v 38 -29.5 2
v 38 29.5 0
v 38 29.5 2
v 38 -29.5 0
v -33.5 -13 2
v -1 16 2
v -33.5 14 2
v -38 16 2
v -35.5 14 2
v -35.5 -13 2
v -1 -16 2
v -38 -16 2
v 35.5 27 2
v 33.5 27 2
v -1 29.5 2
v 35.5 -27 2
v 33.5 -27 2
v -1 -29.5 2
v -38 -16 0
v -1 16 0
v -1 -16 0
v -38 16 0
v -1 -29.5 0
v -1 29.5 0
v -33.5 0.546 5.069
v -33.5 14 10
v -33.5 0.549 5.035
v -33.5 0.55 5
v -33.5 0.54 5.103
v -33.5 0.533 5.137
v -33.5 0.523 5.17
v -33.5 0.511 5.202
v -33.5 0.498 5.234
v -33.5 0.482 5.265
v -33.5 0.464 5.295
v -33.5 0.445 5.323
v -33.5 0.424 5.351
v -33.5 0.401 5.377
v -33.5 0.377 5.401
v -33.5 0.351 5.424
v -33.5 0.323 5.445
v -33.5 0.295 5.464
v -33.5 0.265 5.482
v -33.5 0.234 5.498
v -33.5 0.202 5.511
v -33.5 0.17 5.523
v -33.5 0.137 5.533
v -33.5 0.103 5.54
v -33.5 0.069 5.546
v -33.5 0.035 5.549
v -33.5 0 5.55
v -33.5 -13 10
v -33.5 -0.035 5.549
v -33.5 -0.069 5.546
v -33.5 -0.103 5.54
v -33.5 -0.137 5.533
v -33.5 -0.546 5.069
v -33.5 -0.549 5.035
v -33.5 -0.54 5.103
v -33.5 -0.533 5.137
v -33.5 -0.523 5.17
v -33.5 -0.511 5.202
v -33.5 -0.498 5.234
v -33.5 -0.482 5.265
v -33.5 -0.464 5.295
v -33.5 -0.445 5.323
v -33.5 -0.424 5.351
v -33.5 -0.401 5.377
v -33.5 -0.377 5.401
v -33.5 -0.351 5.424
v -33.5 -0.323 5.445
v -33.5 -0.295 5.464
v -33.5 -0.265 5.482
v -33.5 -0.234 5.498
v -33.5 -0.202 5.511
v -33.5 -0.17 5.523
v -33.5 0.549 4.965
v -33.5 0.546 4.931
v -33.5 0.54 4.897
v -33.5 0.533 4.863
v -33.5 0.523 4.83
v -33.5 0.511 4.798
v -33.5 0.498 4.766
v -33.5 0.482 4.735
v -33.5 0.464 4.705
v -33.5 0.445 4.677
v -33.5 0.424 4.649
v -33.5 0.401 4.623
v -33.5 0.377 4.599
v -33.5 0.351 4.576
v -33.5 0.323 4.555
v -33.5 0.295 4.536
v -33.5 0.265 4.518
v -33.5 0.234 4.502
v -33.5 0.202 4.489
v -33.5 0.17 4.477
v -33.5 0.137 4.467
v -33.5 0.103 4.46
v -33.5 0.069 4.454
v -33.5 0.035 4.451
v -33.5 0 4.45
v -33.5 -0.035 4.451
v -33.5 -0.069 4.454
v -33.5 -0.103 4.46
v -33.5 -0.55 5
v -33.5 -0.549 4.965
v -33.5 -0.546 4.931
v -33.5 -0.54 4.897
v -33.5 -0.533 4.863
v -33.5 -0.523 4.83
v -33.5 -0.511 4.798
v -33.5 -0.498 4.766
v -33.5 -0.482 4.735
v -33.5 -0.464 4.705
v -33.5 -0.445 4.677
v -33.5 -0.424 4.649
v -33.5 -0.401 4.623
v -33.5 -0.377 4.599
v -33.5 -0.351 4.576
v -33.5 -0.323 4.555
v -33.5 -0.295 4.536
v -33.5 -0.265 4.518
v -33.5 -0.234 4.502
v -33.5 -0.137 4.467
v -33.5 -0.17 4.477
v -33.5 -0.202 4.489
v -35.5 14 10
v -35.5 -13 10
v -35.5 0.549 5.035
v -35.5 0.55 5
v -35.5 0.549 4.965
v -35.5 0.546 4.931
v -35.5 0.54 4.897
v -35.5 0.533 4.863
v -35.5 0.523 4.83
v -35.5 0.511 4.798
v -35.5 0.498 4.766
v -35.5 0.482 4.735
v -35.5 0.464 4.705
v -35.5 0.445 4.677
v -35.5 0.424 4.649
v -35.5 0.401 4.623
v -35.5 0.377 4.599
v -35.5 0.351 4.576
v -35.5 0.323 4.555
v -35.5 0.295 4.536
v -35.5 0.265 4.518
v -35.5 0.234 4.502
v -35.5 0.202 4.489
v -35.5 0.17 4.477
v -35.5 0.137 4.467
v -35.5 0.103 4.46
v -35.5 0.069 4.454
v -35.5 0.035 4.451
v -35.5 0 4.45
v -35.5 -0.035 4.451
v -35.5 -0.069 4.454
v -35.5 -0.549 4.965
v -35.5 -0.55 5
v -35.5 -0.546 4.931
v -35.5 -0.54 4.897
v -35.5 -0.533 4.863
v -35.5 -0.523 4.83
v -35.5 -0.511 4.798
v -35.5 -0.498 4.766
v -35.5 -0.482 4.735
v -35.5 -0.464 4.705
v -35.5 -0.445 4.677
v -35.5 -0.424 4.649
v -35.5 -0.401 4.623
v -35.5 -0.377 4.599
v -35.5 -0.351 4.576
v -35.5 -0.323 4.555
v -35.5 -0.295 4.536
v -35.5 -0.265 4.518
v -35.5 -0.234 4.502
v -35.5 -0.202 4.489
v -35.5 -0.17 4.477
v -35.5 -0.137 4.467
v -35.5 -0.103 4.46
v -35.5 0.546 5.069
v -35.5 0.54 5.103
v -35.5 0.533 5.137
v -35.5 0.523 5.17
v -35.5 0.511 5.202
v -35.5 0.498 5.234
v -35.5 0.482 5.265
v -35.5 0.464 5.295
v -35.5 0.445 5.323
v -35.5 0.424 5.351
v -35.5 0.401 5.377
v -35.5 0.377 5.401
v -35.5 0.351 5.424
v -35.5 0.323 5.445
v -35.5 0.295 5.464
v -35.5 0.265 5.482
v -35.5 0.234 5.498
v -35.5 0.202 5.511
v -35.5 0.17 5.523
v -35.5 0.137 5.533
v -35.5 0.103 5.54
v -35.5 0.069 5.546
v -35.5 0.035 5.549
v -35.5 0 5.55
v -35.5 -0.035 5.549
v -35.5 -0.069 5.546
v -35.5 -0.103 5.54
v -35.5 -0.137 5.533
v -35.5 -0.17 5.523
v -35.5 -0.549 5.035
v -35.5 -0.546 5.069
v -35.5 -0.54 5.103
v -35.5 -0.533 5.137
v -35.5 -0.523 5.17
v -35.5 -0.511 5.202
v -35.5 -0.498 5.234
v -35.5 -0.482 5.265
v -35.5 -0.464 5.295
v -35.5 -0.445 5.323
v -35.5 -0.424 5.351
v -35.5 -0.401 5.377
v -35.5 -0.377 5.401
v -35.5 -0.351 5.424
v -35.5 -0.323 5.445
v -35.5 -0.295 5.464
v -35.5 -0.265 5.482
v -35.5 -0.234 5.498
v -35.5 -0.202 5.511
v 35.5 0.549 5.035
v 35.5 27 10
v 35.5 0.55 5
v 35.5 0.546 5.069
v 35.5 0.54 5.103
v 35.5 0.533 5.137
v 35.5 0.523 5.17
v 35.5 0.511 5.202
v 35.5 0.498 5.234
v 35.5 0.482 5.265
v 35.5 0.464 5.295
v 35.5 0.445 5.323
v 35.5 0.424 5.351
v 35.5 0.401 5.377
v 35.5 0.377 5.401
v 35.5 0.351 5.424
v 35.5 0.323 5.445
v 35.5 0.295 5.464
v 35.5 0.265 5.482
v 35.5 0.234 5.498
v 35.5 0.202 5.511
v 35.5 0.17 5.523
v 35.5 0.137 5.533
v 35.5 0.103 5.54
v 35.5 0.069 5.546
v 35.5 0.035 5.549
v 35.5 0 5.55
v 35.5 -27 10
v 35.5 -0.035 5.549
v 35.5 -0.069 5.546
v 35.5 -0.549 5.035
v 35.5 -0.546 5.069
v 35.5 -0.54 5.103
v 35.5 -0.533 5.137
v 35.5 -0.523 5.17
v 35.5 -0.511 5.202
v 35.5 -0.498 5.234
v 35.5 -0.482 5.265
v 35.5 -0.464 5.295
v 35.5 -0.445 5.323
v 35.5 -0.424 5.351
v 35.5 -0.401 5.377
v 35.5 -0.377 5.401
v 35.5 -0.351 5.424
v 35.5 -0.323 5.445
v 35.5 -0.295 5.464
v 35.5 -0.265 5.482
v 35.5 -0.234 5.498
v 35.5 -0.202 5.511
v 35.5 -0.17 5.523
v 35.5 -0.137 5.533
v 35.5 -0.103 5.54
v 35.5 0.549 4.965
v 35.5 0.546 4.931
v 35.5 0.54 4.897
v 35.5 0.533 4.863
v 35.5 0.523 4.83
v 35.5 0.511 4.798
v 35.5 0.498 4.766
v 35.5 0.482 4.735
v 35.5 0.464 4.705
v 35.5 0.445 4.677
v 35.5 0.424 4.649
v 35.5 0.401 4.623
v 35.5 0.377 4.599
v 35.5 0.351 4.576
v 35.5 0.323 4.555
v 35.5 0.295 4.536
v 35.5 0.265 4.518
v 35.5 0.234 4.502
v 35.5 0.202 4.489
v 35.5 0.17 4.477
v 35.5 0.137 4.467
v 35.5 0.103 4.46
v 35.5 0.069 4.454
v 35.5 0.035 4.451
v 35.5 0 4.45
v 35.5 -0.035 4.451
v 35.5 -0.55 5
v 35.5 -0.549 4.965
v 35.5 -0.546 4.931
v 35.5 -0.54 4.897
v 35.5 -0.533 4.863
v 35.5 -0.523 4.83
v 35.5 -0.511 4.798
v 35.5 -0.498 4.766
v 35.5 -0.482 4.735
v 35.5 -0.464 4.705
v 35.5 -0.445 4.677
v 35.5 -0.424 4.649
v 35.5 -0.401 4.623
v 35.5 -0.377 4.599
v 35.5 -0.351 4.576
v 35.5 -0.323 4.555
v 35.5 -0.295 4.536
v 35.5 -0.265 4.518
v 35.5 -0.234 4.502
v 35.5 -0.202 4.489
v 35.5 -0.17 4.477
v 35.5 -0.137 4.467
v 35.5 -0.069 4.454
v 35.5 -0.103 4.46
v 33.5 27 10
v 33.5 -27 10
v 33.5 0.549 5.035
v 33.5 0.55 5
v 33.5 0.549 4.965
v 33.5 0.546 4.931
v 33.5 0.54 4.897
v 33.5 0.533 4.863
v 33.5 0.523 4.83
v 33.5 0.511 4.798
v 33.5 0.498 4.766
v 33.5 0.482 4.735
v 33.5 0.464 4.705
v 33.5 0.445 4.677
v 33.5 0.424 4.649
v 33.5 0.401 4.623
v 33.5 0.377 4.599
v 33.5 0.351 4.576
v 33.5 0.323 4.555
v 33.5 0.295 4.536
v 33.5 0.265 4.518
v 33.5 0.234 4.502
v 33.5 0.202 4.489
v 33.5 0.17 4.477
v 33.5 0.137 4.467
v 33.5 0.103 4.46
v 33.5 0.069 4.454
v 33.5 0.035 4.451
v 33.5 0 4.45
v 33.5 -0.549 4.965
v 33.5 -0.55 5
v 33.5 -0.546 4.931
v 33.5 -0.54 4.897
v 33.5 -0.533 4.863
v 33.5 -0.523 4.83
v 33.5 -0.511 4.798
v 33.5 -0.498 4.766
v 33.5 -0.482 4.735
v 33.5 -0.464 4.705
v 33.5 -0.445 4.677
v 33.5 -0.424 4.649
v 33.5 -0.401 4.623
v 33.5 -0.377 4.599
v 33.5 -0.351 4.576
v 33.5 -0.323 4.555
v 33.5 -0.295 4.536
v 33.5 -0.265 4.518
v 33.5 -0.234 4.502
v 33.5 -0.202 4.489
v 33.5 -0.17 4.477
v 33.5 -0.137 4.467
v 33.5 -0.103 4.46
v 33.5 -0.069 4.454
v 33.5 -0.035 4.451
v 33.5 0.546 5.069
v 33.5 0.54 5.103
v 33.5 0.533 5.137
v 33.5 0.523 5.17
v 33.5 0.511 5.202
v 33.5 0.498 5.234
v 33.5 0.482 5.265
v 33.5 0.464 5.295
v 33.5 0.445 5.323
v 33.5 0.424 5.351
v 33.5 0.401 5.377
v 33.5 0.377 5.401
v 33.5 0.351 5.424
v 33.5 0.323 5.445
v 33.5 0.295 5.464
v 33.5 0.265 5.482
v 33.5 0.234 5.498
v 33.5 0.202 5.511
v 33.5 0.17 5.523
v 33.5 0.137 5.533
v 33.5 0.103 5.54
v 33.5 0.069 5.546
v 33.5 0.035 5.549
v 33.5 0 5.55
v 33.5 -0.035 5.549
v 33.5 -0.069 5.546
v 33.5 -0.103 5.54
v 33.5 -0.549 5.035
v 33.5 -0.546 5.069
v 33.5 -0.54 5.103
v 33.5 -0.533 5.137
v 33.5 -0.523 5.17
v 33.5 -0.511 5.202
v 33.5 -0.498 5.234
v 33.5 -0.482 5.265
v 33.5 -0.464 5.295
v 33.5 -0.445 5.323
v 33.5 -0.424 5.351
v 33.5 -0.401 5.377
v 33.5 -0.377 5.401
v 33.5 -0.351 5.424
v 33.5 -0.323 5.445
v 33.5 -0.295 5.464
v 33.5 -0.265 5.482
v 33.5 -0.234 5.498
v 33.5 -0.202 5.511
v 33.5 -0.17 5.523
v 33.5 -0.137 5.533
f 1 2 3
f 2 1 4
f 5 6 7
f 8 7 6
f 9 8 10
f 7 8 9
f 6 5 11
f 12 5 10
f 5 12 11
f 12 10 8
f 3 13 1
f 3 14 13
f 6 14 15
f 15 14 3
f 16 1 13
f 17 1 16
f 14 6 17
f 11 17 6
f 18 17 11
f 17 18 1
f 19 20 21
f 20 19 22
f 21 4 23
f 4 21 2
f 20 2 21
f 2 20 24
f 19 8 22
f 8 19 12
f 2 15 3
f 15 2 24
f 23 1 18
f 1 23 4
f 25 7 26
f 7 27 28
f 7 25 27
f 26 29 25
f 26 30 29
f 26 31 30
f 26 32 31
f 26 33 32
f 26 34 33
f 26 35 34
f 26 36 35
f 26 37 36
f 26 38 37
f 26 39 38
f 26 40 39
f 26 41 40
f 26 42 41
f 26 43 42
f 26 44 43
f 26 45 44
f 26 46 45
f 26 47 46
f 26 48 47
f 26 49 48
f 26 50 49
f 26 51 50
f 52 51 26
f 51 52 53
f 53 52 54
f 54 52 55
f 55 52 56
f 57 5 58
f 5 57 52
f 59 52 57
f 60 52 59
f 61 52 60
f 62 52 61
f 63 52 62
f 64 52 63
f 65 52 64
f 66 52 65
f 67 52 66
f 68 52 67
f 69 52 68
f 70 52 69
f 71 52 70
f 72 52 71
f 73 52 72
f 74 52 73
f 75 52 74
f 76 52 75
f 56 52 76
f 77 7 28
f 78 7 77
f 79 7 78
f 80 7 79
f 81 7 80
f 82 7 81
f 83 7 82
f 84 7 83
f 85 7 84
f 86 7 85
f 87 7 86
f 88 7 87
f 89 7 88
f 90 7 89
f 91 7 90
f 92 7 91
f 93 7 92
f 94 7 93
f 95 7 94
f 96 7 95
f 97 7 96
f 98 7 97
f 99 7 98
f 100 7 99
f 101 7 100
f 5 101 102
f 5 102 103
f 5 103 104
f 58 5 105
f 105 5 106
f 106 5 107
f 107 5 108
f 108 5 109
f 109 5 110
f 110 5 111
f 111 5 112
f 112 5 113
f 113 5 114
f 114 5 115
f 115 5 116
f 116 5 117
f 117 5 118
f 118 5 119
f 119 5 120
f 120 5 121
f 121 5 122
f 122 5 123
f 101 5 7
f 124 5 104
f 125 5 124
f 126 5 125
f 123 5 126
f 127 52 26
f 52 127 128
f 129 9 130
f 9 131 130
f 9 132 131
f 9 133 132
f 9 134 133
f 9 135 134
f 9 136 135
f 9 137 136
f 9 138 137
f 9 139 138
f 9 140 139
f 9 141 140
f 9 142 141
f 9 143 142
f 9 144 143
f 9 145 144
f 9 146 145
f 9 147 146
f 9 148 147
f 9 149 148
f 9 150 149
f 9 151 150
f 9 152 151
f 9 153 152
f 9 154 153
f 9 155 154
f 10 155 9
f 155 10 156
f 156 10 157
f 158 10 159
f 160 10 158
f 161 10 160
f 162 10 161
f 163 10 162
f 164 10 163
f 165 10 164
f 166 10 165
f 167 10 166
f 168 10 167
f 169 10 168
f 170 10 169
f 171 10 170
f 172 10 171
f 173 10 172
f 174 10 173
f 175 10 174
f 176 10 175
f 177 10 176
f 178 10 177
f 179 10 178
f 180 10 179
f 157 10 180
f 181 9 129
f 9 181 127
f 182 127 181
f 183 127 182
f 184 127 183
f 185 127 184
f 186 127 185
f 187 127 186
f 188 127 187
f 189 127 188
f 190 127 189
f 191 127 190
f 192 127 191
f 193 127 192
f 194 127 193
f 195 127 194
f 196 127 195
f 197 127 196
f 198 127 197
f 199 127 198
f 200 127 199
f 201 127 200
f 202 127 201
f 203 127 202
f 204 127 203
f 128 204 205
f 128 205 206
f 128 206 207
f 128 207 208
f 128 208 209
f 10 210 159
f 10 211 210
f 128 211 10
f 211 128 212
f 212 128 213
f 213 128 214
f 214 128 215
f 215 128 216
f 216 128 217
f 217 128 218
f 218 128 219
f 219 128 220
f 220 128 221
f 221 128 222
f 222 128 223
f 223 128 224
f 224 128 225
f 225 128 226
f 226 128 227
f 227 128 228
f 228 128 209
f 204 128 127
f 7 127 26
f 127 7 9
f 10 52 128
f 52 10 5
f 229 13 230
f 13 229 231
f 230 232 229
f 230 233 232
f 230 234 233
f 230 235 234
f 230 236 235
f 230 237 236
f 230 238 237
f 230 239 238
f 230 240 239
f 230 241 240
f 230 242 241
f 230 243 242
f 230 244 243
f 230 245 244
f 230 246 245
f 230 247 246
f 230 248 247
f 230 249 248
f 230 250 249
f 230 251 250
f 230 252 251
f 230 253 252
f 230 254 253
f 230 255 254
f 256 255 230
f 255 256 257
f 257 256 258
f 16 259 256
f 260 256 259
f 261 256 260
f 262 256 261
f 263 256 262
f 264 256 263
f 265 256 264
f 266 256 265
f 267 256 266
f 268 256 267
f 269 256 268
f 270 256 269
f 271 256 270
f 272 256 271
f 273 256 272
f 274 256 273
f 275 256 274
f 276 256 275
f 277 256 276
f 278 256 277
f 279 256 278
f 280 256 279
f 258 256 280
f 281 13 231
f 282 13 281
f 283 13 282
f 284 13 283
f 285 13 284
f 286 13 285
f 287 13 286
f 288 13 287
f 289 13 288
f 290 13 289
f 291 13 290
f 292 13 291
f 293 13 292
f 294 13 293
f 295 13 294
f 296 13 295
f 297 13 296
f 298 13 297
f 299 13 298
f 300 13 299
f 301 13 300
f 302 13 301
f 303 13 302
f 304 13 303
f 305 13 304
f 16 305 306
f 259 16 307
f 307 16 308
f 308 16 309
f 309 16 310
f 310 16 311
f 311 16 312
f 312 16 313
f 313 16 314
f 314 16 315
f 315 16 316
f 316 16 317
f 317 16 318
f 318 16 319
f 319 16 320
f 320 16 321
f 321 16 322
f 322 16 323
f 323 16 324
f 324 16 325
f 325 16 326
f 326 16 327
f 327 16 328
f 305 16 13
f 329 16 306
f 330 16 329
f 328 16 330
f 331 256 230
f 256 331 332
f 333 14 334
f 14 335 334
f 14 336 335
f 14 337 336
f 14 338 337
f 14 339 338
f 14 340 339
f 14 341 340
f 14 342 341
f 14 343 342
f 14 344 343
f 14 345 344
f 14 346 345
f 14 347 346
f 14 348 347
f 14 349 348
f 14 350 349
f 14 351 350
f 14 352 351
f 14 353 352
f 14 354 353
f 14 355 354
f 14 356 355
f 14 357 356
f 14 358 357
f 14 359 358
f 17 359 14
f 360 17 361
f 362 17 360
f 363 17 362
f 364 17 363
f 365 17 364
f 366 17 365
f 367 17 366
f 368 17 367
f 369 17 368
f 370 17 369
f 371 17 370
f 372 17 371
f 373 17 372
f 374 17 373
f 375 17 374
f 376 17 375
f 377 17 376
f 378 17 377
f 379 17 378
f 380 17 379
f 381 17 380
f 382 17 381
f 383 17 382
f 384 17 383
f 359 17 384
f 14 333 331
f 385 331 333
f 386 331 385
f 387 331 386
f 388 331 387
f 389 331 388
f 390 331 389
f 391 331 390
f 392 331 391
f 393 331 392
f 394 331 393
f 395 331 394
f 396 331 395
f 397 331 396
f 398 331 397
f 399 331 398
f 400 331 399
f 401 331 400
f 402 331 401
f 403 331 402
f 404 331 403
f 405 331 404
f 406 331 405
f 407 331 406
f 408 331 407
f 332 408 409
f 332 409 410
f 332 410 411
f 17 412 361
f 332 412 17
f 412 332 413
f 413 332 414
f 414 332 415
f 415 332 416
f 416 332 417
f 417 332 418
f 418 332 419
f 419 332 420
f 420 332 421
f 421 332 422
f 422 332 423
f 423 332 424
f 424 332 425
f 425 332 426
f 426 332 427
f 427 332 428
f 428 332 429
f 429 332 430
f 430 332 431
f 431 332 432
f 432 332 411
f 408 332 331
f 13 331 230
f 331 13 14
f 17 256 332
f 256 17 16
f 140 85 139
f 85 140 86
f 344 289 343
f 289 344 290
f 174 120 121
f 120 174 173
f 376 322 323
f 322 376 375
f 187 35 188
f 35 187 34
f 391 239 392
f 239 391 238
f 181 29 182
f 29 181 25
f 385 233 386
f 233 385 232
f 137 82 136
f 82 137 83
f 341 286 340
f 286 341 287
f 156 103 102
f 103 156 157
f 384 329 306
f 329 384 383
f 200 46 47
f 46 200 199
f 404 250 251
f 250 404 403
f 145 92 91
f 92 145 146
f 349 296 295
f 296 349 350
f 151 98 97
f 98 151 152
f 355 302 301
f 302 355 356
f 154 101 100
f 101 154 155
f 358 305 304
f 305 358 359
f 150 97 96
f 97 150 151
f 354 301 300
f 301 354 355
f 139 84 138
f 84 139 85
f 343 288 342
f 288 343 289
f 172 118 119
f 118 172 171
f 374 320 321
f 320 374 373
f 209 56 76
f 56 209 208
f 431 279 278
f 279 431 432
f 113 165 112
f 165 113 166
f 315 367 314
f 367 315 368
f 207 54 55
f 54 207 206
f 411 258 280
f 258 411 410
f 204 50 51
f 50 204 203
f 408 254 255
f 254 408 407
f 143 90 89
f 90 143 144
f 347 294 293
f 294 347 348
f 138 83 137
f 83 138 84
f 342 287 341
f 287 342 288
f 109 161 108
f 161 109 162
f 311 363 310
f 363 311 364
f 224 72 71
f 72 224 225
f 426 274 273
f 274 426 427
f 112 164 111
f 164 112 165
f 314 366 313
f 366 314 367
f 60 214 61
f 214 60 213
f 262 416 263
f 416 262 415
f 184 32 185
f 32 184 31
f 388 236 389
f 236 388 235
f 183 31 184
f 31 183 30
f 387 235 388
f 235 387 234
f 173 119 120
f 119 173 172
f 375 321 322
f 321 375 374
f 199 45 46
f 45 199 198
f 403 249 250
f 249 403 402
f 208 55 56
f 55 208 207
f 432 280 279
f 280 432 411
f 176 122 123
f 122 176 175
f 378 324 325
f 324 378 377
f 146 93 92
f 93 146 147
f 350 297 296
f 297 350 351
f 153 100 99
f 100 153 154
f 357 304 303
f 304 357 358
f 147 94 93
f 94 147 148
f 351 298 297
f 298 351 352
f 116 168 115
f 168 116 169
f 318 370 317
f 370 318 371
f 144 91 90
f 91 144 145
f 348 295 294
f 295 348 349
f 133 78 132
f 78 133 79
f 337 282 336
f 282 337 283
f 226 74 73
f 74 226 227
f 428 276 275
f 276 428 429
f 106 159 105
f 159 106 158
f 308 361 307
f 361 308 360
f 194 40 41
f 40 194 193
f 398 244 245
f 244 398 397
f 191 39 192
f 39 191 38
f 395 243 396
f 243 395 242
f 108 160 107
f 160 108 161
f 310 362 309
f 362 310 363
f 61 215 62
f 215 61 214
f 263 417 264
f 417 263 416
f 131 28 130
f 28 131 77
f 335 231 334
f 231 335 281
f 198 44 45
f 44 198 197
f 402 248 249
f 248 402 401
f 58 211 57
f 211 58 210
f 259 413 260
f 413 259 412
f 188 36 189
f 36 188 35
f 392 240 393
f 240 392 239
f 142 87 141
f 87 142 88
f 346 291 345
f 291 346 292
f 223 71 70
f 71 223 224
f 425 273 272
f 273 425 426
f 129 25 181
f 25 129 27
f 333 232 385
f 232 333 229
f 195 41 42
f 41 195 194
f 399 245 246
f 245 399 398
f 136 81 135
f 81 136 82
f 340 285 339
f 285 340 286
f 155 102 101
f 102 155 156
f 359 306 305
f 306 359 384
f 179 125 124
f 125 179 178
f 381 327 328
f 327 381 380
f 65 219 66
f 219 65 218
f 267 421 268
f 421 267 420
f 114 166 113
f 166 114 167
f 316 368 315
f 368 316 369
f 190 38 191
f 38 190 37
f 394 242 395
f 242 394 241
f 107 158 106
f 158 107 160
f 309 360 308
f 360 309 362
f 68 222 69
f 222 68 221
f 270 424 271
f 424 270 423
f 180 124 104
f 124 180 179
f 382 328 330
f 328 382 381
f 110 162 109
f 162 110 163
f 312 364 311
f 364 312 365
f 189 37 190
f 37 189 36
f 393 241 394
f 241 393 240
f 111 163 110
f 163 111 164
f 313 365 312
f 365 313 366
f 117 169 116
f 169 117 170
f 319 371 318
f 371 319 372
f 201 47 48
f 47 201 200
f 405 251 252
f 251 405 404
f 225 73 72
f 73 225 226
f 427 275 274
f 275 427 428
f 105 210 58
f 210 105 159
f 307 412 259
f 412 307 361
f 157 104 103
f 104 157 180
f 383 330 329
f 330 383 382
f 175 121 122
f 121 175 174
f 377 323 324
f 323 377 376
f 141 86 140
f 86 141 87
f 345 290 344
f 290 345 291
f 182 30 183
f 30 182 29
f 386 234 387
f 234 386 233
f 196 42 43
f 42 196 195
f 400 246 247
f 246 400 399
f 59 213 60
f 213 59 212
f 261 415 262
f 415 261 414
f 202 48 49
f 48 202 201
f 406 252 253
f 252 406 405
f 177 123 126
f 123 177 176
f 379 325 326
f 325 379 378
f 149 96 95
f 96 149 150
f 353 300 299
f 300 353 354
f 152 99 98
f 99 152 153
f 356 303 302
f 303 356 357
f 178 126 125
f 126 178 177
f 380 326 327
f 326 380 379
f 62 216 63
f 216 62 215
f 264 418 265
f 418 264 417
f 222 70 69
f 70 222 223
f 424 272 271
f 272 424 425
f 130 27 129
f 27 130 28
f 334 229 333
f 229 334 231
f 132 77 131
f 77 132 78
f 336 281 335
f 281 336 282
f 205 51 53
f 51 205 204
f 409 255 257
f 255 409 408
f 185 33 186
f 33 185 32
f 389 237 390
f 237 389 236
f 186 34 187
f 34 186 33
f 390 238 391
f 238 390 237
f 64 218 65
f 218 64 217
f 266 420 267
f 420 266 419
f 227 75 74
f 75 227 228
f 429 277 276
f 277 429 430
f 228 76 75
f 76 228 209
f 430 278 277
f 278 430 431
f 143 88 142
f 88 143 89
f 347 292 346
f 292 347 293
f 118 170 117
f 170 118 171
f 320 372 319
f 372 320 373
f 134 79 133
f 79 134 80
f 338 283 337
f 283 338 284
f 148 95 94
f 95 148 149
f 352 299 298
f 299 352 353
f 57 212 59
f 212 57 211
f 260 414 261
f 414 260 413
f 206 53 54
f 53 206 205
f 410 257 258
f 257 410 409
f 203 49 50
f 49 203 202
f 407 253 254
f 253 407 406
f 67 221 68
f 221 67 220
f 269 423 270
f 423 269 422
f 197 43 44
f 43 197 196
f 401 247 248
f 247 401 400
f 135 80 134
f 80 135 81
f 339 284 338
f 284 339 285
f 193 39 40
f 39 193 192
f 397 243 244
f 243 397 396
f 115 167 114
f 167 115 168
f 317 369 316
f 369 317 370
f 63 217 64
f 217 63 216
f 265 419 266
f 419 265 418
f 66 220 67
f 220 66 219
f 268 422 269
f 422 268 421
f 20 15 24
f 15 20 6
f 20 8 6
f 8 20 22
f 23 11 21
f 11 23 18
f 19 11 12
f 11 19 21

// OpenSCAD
//  IR remote sender 
//
//	v 1.0 - 01/06/2020 - initial release (Marc Durvaux)
//
//  
//
//

// design control
test_fit   = 0 ;	// set to one for test fit
top_bottom = 1 ;	// 0 = bottom only, 1 = top only
ear_mouse  = 0 ;    // set to one to add ear mouse to avoid warping during 3D printing

// parameters
$fn = 100 ;
tol        = 0.50 ;	    // 
wall_th    = 2.00 ;     // side wall thickness

mouse_ear_h =  0.80 ;   // mouse ears to avoid warping
mouse_ear_r = 10.00 ;    

// bottom part
in_x = 72.00 ;
in_y = 55.00 ;
in_z = 33.00 ;

// USB connector
usb_w = 12.00 + 4 * tol ;
usb_h = 11.00 + 4 * tol ;
usb_y = usb_w - 9.40 + 2 * tol ;
usb_z =  4.00 - 2 * tol ;

// window
win_w = 35.00 ;
win_h = 14.00 ;

// cover
top_h = 10.00 ;

// fixation screw
out_d =  2.20 ;
in_d  =  1.10 ;


// calculated dimensions
out_x = in_x + 2 * wall_th;
out_y = in_y + 2 * wall_th;
out_z = in_z + 1 * wall_th;


// create device
if (test_fit == 1) {
	// test fit
	bottom_case();
    translate([0, 0 , out_z + wall_th])
        rotate([ 0, 180, 0])
            cover();
} else {
	if (top_bottom < 1) {
		bottom_case(); 
	} else {
        cover();
	}
}



module cover() {
    difference() {
        union() {
            translate([-out_x/2, -out_y/2, 0]) 
                cube( size=[out_x, out_y, wall_th] ) ;      
            translate([-in_x/2 + tol, -in_y/2 + win_h + tol, 0])
                cube( size=[wall_th, in_y - 2 * win_h, top_h] ) ; 
            translate([in_x/2 - wall_th - tol, -in_y/2 + tol, 0])
                cube( size=[wall_th, in_y - 2 * tol, top_h] ) ; 
        }
        
        union() {
        translate([-out_x, 0 , top_h /2]) 
            rotate([ 0, 90, 0])
                cylinder( h = 2 * out_x, d = in_d) ;
        
        x_cut = win_w + 2 * wall_th ;    
        translate([-out_x/2 - wall_th, out_y/2 - win_h + tol, -wall_th]) 
            cube( size=[x_cut, win_h, 3 * wall_th] ) ;     
        translate([-out_x/2 - wall_th, -out_y/2 -tol , -wall_th]) 
            cube( size=[x_cut, win_h, 3 * wall_th] ) ;     
        } 
    }
}


module bottom_case() {
    difference() {
        translate([-out_x/2, -out_y/2, 0]) 
            cube( size=[out_x, out_y, out_z] ) ;        
        
        union() {
            translate([-in_x/2, -in_y/2, wall_th]) 
                cube( size=[in_x, in_y, out_z] ) ; 
            
            translate([-out_x/2 - wall_th, usb_y , usb_z + wall_th]) 
                cube( size=[4 * wall_th , usb_w, usb_h] ) ; 
            
            translate([in_x/2 - win_w, -out_y , out_z - win_h]) 
                cube( size=[win_w , 2 * out_y, win_h + tol] ) ; 
            
            translate([-out_x, 0 , out_z + wall_th - top_h /2]) 
                rotate([ 0, 90, 0])
                    cylinder( h = 2 * out_x, d = out_d) ;
             
        }   
    }
}


module add_ear_mouse( x, y) {
    if (ear_mouse == 1) {   // add mouse ears to avoid warping
        translate([-x, -y, 0])
            cylinder(h=mouse_ear_h, r=mouse_ear_r) ;   
        translate([-x, y, 0])
            cylinder(h=mouse_ear_h, r=mouse_ear_r) ;
        translate([x, -y, 0])
            cylinder(h=mouse_ear_h, r=mouse_ear_r) ;
        translate([x, y, 0])
            cylinder(h=mouse_ear_h, r=mouse_ear_r) ;  
    }  
}
